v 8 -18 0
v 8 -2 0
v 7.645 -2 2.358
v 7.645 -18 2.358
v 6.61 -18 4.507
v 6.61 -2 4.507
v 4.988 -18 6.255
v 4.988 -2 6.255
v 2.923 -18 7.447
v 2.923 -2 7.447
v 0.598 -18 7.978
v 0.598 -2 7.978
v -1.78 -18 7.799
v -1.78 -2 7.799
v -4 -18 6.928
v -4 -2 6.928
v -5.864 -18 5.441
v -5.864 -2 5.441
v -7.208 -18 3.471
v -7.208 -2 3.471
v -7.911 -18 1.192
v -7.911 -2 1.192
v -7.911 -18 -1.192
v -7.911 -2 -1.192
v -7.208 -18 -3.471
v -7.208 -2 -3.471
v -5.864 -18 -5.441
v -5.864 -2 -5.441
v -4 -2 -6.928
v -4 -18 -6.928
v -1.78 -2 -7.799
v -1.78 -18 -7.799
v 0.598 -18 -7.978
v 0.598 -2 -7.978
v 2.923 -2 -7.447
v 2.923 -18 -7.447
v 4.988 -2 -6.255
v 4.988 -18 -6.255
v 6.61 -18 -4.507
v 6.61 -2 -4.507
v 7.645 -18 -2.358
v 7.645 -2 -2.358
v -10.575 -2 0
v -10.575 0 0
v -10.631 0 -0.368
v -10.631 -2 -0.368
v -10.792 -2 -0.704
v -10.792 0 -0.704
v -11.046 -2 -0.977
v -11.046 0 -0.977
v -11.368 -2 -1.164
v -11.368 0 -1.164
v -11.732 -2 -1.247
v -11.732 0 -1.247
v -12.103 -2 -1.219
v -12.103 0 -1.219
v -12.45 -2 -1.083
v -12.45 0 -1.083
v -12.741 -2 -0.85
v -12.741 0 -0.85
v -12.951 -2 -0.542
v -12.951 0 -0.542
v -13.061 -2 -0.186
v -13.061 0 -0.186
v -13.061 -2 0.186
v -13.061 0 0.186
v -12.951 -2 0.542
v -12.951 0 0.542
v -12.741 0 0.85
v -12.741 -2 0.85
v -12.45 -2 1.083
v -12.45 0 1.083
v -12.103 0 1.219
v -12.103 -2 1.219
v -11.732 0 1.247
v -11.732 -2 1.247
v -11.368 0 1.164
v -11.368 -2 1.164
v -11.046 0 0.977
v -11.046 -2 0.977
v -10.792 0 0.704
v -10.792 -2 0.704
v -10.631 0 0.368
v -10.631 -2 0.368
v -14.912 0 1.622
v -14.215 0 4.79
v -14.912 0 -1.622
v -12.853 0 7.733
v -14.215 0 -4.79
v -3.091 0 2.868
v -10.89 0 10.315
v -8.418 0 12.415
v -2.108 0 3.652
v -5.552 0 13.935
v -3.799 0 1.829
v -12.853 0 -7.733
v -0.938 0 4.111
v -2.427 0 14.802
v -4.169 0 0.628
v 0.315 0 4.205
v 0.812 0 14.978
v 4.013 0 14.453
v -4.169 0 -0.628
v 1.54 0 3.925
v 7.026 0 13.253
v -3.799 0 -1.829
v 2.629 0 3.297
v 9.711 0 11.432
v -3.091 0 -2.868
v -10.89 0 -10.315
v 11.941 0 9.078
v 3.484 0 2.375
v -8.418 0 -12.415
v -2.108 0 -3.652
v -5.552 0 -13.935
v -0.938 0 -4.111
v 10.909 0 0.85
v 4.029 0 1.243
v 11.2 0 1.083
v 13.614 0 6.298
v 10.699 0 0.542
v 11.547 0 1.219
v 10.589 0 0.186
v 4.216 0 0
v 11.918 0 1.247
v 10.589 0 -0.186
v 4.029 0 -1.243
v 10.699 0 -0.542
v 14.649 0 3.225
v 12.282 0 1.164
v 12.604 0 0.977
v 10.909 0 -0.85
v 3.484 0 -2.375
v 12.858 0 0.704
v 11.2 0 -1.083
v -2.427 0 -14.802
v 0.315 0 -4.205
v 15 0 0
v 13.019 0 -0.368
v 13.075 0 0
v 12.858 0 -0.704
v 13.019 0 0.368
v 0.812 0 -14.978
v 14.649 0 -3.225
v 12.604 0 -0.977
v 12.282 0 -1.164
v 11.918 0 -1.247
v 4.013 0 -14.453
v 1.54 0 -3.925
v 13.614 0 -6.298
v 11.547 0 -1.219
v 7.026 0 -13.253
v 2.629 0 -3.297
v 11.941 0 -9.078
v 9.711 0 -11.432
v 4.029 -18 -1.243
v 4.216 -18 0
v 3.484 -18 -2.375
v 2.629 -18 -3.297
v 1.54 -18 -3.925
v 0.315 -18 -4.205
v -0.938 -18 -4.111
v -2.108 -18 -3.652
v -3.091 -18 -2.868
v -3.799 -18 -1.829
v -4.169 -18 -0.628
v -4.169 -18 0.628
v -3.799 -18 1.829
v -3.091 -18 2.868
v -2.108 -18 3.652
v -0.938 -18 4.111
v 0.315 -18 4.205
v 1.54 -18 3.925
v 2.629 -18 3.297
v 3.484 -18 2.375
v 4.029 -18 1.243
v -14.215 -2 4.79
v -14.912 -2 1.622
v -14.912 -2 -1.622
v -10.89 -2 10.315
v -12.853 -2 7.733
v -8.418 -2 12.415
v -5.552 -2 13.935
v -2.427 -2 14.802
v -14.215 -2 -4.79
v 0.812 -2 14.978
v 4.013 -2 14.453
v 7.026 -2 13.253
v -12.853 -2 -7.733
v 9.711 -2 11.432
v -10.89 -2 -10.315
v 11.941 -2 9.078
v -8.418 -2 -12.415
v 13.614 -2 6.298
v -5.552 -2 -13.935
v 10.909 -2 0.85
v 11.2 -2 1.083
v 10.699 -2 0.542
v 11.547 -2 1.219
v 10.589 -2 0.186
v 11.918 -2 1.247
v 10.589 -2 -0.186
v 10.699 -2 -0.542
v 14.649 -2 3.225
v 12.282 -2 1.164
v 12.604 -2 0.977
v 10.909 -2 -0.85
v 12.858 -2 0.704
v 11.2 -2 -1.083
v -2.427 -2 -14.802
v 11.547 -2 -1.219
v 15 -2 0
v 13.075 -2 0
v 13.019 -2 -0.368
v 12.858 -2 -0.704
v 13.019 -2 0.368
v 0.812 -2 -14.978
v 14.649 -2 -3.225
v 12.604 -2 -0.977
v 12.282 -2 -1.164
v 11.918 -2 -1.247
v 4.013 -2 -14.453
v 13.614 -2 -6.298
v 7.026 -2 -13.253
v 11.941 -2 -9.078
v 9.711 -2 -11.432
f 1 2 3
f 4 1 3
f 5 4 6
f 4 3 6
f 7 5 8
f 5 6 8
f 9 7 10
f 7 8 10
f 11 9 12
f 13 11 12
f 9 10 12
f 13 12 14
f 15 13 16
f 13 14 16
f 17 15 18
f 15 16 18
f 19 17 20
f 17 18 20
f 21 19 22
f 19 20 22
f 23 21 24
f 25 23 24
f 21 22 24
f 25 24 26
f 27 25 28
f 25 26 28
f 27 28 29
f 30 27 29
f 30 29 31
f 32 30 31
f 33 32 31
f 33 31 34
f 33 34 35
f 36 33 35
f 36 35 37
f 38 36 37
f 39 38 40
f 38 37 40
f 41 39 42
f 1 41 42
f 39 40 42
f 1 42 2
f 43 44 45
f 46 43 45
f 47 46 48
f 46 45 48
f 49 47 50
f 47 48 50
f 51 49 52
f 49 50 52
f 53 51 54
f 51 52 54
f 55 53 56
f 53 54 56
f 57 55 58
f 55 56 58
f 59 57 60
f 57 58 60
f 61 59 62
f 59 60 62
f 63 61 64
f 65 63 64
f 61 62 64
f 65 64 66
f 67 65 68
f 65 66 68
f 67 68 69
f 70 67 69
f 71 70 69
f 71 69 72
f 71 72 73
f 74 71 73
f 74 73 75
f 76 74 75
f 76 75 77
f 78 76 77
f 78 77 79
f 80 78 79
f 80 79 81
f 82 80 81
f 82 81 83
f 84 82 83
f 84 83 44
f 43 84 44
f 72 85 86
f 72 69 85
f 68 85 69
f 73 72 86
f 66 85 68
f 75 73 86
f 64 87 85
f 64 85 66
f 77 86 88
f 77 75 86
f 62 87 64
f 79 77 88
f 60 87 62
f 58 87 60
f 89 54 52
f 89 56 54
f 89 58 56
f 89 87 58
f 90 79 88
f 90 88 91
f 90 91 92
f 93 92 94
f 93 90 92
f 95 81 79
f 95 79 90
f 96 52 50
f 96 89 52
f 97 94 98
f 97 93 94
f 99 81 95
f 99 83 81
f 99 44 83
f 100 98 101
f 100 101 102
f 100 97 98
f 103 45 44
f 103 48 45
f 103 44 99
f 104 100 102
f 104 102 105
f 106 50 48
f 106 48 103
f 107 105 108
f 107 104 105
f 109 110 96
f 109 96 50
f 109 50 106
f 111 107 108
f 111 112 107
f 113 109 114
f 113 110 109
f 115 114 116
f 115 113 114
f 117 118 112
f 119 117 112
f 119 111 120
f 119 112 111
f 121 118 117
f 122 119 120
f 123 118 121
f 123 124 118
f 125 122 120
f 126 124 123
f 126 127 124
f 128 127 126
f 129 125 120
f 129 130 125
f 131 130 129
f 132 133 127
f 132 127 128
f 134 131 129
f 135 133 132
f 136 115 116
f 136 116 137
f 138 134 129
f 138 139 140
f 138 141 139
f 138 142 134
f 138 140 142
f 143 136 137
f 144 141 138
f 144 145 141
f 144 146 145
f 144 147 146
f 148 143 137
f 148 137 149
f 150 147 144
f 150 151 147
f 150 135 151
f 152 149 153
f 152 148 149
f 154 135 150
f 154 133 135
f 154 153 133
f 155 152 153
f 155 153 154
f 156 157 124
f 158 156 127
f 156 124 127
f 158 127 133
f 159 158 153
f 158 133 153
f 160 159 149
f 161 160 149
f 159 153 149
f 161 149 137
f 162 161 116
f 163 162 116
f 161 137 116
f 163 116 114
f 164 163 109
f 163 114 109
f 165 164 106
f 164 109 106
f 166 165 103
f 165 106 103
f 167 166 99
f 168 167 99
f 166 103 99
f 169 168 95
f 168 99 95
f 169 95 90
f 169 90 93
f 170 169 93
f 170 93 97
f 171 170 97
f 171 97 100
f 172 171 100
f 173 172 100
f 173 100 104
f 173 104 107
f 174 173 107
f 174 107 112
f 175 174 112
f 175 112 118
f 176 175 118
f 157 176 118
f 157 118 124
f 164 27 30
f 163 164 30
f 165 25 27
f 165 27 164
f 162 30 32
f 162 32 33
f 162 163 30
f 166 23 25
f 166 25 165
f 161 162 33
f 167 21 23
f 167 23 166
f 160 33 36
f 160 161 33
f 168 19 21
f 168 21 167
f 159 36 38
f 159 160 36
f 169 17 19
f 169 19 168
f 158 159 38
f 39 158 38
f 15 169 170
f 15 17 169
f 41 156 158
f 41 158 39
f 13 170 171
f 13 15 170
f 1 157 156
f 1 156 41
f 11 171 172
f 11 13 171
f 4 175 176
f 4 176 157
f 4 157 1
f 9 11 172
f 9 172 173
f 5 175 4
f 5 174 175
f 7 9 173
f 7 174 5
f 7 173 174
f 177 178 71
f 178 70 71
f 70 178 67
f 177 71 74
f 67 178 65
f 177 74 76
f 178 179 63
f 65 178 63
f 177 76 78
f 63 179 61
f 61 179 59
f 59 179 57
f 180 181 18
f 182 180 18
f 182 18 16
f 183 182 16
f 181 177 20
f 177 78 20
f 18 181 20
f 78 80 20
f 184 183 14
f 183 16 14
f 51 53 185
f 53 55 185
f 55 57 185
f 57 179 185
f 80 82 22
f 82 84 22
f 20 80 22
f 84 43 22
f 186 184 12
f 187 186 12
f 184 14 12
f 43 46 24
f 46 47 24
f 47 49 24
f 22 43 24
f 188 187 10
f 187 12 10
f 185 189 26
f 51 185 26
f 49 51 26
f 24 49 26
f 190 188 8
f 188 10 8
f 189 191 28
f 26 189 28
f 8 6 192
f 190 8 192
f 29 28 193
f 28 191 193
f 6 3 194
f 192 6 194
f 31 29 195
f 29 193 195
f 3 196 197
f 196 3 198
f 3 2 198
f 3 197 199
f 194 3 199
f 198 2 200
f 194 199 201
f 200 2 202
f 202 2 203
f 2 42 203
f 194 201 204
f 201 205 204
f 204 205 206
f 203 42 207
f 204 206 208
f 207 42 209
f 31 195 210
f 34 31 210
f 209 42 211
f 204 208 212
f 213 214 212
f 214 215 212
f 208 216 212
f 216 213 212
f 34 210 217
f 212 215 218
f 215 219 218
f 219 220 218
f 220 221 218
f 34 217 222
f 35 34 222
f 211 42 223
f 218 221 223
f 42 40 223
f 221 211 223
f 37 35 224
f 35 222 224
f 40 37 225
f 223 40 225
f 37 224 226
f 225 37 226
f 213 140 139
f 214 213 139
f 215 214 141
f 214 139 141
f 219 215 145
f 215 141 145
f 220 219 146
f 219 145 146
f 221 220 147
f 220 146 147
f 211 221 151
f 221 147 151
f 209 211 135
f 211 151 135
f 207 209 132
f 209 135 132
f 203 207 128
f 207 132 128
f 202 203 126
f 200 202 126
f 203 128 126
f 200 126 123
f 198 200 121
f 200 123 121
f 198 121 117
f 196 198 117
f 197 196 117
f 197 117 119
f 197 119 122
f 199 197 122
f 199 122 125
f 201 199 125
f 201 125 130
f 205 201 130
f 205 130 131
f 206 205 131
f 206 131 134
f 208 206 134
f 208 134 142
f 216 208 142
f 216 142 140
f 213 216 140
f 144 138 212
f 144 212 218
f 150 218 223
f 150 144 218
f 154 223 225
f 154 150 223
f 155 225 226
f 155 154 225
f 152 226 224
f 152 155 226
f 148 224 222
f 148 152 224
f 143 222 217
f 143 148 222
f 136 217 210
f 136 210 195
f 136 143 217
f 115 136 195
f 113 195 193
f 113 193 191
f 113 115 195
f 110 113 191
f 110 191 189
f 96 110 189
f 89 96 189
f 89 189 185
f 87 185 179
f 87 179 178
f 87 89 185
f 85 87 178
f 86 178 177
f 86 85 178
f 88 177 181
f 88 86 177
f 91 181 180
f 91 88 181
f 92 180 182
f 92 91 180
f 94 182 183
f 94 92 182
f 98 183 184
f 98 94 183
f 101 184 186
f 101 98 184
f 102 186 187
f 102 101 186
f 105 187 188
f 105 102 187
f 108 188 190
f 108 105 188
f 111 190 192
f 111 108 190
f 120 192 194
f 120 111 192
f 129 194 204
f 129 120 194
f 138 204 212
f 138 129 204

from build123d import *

# Parameters (mm, degrees)
SKETCH1_R                   = 15
BOSS_EXTRUDE1_DEPTH         = 2
SKETCH2_R                   = 8
BOSS_EXTRUDE2_DEPTH         = 16
F_3_8_24_TAPPED_HOLE1_D     = 8.4328
F_3_8_24_TAPPED_HOLE1_DEPTH = 24.4
F_3_8_24_TAPPED_HOLE1_TIP   = 2.533468714
SKETCH5_R                   = 1.25
CUT_EXTRUDE1_DEPTH          = 10


with BuildPart() as part:
    # Sketch1 → Boss-Extrude1 (new body)
    with BuildSketch(Plane(origin=(0, 0, 0), x_dir=(1, 0, 0), z_dir=(0, 1, 0))):
        Circle(SKETCH1_R)
    extrude(amount=-BOSS_EXTRUDE1_DEPTH)

    # Sketch2 → Boss-Extrude2 (add)
    with BuildSketch(Plane.XZ.offset(2)):
        Circle(SKETCH2_R)
    extrude(amount=BOSS_EXTRUDE2_DEPTH)

    # 3/8-24 Tapped Hole1
    with Locations(Plane(origin=(0, -18, 0), x_dir=(-1, 0, 0), z_dir=(0, -1, 0))):
        with Locations((0, 0)):
            Hole(F_3_8_24_TAPPED_HOLE1_D / 2, depth=F_3_8_24_TAPPED_HOLE1_DEPTH)
            with Locations((0, 0, -(F_3_8_24_TAPPED_HOLE1_DEPTH + F_3_8_24_TAPPED_HOLE1_TIP / 2))):  # 118° drill point
                Cone(0, F_3_8_24_TAPPED_HOLE1_D / 2, F_3_8_24_TAPPED_HOLE1_TIP, mode=Mode.SUBTRACT)

    # Sketch5 → Cut-Extrude1 (cut)
    with BuildSketch(Plane(origin=(0, 0, 0), x_dir=(1, 0, 0), z_dir=(0, 1, 0))):
        with Locations((11.825, 0)):
            Circle(SKETCH5_R)
        with Locations((-11.825, 0)):
            Circle(SKETCH5_R)
    extrude(amount=-CUT_EXTRUDE1_DEPTH, mode=Mode.SUBTRACT)


solid = part.part
